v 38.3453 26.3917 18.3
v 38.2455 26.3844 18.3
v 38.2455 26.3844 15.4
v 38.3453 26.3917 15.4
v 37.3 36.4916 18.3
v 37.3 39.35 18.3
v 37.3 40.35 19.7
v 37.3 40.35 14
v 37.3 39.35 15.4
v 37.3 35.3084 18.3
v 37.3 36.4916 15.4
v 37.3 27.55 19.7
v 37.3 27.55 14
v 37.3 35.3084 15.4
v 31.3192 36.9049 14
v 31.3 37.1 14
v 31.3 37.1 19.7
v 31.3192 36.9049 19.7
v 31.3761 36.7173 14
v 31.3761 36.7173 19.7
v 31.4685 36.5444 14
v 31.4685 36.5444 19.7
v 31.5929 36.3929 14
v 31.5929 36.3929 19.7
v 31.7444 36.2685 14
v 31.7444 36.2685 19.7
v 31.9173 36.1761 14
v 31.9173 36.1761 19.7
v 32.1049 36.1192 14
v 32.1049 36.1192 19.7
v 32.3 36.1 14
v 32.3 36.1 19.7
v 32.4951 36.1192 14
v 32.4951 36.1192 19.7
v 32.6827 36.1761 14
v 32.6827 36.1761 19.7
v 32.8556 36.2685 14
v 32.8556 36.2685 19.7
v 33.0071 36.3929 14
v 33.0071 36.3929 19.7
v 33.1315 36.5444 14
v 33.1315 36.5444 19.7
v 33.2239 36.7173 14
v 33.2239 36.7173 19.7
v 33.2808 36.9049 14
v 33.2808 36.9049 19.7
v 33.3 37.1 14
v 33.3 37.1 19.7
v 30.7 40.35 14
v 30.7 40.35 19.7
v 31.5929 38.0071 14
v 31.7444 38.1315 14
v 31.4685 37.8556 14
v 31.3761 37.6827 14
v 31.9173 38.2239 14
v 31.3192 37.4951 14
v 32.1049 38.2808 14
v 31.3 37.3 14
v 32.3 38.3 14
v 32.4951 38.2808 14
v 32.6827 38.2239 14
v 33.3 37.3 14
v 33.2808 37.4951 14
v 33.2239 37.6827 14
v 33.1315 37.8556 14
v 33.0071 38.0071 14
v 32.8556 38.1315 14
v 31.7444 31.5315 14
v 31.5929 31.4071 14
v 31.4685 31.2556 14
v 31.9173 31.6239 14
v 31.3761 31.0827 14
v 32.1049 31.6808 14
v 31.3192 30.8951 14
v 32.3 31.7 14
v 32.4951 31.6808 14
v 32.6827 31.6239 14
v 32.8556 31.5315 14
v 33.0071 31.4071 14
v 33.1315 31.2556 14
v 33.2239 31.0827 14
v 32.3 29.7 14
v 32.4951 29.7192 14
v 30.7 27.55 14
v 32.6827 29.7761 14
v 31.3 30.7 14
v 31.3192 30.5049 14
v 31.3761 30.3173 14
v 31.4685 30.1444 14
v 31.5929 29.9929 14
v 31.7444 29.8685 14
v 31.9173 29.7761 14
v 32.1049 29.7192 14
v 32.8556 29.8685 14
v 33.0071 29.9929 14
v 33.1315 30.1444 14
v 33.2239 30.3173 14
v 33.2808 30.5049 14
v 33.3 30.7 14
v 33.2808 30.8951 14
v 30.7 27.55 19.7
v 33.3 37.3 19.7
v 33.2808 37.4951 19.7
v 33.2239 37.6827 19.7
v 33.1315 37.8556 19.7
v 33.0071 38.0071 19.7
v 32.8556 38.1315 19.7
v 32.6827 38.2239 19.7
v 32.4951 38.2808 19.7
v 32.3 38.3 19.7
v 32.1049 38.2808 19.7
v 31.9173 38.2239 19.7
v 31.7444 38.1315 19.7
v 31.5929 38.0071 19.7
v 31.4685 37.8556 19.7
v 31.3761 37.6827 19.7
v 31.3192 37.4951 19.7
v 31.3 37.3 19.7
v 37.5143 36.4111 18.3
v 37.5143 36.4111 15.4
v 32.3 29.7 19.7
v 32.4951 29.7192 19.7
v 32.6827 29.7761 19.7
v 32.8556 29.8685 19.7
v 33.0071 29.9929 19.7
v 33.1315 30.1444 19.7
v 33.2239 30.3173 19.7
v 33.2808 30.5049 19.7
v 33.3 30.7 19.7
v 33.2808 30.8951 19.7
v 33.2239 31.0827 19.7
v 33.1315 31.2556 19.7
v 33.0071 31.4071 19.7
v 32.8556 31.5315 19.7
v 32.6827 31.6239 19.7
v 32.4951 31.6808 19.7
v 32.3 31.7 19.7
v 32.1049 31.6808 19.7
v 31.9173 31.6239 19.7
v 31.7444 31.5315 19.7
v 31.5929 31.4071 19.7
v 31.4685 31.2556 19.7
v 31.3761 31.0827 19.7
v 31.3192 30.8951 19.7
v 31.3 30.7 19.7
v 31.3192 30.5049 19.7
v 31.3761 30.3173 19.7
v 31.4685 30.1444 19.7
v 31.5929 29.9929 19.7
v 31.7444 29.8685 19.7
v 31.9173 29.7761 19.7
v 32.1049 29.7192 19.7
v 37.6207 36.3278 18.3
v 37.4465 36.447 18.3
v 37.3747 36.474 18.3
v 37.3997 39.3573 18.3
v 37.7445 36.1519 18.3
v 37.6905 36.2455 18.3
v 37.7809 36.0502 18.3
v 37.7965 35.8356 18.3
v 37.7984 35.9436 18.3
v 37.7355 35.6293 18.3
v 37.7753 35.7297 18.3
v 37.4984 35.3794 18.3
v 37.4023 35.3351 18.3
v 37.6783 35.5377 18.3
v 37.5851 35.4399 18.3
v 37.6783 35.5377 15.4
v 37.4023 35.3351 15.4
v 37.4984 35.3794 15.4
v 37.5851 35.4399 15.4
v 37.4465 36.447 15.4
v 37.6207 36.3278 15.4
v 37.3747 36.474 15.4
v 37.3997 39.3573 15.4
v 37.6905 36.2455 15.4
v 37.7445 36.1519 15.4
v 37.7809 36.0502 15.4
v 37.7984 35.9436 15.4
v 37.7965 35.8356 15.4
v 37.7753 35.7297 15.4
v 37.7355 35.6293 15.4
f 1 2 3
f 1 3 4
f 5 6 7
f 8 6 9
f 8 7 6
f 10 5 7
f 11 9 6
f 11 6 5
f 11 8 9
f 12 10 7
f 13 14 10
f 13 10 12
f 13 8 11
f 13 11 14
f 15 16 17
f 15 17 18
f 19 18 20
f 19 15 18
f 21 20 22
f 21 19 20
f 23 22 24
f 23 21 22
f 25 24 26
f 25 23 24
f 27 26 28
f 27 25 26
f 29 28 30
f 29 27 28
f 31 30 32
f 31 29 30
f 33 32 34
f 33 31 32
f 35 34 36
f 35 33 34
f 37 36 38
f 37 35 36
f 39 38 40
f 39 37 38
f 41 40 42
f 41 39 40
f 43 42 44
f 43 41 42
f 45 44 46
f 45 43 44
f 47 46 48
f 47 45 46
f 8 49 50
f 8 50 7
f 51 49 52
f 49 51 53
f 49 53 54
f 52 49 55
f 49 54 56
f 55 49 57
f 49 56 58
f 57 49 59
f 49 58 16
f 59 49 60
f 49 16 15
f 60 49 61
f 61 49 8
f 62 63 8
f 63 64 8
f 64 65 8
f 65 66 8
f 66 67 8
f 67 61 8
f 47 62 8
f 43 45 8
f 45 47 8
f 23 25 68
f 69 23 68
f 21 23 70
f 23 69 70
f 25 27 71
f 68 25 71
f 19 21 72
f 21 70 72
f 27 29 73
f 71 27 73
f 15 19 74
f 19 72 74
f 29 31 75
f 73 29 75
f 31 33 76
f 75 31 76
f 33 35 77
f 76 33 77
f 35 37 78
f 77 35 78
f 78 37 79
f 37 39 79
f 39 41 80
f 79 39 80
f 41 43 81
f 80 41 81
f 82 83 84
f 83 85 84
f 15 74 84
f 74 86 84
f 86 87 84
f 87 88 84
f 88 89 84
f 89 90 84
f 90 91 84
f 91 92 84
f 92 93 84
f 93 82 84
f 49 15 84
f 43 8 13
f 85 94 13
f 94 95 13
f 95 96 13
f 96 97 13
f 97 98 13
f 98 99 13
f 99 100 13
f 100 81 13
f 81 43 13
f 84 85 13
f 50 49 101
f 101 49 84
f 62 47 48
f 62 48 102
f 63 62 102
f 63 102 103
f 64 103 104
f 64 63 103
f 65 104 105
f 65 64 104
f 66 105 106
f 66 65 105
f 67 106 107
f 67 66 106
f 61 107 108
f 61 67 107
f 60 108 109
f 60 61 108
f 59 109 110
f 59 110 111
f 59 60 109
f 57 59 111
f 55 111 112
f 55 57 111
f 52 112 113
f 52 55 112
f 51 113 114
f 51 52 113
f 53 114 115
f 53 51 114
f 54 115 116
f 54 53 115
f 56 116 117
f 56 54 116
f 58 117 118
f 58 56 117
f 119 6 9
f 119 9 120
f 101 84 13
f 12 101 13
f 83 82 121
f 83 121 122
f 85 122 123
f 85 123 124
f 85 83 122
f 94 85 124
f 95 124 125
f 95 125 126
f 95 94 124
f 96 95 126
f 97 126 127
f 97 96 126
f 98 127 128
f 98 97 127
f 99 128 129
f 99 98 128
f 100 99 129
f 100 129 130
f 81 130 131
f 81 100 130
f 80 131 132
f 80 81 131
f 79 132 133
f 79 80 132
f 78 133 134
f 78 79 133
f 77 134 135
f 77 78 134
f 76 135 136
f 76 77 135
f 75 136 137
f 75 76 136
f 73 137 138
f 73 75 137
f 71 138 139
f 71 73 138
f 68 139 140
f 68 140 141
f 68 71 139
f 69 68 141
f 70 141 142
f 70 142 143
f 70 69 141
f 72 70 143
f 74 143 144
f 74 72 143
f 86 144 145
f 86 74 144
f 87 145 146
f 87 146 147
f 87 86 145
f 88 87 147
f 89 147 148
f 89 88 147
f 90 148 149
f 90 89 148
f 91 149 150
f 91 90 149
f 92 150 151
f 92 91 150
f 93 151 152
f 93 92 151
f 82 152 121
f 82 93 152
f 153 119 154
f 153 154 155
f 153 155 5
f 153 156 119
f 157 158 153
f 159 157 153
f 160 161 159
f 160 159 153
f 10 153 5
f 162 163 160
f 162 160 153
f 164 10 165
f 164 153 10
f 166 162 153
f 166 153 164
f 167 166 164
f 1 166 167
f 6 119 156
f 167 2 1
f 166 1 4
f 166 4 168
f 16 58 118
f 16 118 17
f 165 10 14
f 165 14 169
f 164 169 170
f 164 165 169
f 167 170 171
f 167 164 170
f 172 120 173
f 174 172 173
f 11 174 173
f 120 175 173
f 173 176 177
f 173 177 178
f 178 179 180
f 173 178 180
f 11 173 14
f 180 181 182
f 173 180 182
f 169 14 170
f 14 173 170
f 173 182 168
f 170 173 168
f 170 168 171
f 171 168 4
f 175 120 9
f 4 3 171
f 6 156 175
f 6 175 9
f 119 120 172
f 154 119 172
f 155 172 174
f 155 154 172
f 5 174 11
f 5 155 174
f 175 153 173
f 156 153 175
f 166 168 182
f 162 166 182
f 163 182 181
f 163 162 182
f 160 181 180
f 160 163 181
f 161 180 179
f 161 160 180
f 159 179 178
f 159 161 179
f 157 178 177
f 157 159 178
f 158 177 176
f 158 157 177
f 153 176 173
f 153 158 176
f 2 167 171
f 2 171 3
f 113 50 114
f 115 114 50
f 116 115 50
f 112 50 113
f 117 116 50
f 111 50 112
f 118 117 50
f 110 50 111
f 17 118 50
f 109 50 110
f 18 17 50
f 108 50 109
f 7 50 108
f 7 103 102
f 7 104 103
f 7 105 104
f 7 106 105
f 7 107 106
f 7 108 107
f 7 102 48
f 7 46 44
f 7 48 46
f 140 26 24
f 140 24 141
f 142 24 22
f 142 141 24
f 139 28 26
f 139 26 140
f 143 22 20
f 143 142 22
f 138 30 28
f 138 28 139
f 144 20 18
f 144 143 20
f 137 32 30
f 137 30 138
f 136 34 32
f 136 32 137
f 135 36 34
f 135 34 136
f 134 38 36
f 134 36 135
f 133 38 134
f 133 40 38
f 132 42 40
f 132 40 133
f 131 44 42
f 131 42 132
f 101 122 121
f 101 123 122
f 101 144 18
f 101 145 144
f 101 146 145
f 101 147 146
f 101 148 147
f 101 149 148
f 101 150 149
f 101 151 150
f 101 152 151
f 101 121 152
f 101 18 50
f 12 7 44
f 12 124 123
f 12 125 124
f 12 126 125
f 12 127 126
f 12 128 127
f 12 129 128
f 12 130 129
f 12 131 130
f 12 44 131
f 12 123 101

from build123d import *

# Parameters (mm, degrees)
SKETCH018_W             = 12.8
SKETCH018_H             = 6.6
SKETCH018_R             = 1
PAD004_DEPTH            = 5.7
PAD005_DEPTH            = 2.9
PAD006_DEPTH            = 2.9
BODY004_PLACEMENT_ANGLE = 90


with BuildPart() as part:
    # Sketch018 → Pad004 (new body)
    with BuildSketch(Plane.XY):
        Rectangle(SKETCH018_W, SKETCH018_H)
        with Locations((3.25, -1.7)):
            Circle(SKETCH018_R, mode=Mode.SUBTRACT)
        with BuildLine():
            ThreePointArc((-3.35, -0.7), (-4.35, -1.7), (-3.35, -2.7))
            Line((-3.35, -2.7), (-3.15, -2.7))
            ThreePointArc((-3.15, -2.7), (-2.15, -1.7), (-3.15, -0.7))
            Line((-3.15, -0.7), (-3.35, -0.7))
        make_face(mode=Mode.SUBTRACT)
    extrude(amount=PAD004_DEPTH)

    # Sketch019 (on Face11 of Pad004) → Pad005 (join)
    with BuildSketch(Plane.XY.offset(4.3)):
        with BuildLine():
            ThreePointArc((-1.35, 3.2), (-1.95, 3.8), (-2.55, 3.2))
            Line((-2.55, 3.2), (-1.35, 3.2))
        make_face()
    extrude(amount=-PAD005_DEPTH)

    # Sketch022 (on Face4 of Pad005) → Pad006 (join)
    with BuildSketch(Plane.XY.offset(4.3)):
        Polygon((-5.4, 3.3), (7.565569, 4.245522), (7.558296, 4.345257), (-5.407273, 3.399735), align=None)
    extrude(amount=-PAD006_DEPTH)


with BuildPart() as part_1:
    # Body004 placement: moved
    add(part.part.moved(Location((34, 33.95, 14))).rotate(Axis((34, 33.95, 14), (0, 0, -1)), BODY004_PLACEMENT_ANGLE))


solid = part_1.part
